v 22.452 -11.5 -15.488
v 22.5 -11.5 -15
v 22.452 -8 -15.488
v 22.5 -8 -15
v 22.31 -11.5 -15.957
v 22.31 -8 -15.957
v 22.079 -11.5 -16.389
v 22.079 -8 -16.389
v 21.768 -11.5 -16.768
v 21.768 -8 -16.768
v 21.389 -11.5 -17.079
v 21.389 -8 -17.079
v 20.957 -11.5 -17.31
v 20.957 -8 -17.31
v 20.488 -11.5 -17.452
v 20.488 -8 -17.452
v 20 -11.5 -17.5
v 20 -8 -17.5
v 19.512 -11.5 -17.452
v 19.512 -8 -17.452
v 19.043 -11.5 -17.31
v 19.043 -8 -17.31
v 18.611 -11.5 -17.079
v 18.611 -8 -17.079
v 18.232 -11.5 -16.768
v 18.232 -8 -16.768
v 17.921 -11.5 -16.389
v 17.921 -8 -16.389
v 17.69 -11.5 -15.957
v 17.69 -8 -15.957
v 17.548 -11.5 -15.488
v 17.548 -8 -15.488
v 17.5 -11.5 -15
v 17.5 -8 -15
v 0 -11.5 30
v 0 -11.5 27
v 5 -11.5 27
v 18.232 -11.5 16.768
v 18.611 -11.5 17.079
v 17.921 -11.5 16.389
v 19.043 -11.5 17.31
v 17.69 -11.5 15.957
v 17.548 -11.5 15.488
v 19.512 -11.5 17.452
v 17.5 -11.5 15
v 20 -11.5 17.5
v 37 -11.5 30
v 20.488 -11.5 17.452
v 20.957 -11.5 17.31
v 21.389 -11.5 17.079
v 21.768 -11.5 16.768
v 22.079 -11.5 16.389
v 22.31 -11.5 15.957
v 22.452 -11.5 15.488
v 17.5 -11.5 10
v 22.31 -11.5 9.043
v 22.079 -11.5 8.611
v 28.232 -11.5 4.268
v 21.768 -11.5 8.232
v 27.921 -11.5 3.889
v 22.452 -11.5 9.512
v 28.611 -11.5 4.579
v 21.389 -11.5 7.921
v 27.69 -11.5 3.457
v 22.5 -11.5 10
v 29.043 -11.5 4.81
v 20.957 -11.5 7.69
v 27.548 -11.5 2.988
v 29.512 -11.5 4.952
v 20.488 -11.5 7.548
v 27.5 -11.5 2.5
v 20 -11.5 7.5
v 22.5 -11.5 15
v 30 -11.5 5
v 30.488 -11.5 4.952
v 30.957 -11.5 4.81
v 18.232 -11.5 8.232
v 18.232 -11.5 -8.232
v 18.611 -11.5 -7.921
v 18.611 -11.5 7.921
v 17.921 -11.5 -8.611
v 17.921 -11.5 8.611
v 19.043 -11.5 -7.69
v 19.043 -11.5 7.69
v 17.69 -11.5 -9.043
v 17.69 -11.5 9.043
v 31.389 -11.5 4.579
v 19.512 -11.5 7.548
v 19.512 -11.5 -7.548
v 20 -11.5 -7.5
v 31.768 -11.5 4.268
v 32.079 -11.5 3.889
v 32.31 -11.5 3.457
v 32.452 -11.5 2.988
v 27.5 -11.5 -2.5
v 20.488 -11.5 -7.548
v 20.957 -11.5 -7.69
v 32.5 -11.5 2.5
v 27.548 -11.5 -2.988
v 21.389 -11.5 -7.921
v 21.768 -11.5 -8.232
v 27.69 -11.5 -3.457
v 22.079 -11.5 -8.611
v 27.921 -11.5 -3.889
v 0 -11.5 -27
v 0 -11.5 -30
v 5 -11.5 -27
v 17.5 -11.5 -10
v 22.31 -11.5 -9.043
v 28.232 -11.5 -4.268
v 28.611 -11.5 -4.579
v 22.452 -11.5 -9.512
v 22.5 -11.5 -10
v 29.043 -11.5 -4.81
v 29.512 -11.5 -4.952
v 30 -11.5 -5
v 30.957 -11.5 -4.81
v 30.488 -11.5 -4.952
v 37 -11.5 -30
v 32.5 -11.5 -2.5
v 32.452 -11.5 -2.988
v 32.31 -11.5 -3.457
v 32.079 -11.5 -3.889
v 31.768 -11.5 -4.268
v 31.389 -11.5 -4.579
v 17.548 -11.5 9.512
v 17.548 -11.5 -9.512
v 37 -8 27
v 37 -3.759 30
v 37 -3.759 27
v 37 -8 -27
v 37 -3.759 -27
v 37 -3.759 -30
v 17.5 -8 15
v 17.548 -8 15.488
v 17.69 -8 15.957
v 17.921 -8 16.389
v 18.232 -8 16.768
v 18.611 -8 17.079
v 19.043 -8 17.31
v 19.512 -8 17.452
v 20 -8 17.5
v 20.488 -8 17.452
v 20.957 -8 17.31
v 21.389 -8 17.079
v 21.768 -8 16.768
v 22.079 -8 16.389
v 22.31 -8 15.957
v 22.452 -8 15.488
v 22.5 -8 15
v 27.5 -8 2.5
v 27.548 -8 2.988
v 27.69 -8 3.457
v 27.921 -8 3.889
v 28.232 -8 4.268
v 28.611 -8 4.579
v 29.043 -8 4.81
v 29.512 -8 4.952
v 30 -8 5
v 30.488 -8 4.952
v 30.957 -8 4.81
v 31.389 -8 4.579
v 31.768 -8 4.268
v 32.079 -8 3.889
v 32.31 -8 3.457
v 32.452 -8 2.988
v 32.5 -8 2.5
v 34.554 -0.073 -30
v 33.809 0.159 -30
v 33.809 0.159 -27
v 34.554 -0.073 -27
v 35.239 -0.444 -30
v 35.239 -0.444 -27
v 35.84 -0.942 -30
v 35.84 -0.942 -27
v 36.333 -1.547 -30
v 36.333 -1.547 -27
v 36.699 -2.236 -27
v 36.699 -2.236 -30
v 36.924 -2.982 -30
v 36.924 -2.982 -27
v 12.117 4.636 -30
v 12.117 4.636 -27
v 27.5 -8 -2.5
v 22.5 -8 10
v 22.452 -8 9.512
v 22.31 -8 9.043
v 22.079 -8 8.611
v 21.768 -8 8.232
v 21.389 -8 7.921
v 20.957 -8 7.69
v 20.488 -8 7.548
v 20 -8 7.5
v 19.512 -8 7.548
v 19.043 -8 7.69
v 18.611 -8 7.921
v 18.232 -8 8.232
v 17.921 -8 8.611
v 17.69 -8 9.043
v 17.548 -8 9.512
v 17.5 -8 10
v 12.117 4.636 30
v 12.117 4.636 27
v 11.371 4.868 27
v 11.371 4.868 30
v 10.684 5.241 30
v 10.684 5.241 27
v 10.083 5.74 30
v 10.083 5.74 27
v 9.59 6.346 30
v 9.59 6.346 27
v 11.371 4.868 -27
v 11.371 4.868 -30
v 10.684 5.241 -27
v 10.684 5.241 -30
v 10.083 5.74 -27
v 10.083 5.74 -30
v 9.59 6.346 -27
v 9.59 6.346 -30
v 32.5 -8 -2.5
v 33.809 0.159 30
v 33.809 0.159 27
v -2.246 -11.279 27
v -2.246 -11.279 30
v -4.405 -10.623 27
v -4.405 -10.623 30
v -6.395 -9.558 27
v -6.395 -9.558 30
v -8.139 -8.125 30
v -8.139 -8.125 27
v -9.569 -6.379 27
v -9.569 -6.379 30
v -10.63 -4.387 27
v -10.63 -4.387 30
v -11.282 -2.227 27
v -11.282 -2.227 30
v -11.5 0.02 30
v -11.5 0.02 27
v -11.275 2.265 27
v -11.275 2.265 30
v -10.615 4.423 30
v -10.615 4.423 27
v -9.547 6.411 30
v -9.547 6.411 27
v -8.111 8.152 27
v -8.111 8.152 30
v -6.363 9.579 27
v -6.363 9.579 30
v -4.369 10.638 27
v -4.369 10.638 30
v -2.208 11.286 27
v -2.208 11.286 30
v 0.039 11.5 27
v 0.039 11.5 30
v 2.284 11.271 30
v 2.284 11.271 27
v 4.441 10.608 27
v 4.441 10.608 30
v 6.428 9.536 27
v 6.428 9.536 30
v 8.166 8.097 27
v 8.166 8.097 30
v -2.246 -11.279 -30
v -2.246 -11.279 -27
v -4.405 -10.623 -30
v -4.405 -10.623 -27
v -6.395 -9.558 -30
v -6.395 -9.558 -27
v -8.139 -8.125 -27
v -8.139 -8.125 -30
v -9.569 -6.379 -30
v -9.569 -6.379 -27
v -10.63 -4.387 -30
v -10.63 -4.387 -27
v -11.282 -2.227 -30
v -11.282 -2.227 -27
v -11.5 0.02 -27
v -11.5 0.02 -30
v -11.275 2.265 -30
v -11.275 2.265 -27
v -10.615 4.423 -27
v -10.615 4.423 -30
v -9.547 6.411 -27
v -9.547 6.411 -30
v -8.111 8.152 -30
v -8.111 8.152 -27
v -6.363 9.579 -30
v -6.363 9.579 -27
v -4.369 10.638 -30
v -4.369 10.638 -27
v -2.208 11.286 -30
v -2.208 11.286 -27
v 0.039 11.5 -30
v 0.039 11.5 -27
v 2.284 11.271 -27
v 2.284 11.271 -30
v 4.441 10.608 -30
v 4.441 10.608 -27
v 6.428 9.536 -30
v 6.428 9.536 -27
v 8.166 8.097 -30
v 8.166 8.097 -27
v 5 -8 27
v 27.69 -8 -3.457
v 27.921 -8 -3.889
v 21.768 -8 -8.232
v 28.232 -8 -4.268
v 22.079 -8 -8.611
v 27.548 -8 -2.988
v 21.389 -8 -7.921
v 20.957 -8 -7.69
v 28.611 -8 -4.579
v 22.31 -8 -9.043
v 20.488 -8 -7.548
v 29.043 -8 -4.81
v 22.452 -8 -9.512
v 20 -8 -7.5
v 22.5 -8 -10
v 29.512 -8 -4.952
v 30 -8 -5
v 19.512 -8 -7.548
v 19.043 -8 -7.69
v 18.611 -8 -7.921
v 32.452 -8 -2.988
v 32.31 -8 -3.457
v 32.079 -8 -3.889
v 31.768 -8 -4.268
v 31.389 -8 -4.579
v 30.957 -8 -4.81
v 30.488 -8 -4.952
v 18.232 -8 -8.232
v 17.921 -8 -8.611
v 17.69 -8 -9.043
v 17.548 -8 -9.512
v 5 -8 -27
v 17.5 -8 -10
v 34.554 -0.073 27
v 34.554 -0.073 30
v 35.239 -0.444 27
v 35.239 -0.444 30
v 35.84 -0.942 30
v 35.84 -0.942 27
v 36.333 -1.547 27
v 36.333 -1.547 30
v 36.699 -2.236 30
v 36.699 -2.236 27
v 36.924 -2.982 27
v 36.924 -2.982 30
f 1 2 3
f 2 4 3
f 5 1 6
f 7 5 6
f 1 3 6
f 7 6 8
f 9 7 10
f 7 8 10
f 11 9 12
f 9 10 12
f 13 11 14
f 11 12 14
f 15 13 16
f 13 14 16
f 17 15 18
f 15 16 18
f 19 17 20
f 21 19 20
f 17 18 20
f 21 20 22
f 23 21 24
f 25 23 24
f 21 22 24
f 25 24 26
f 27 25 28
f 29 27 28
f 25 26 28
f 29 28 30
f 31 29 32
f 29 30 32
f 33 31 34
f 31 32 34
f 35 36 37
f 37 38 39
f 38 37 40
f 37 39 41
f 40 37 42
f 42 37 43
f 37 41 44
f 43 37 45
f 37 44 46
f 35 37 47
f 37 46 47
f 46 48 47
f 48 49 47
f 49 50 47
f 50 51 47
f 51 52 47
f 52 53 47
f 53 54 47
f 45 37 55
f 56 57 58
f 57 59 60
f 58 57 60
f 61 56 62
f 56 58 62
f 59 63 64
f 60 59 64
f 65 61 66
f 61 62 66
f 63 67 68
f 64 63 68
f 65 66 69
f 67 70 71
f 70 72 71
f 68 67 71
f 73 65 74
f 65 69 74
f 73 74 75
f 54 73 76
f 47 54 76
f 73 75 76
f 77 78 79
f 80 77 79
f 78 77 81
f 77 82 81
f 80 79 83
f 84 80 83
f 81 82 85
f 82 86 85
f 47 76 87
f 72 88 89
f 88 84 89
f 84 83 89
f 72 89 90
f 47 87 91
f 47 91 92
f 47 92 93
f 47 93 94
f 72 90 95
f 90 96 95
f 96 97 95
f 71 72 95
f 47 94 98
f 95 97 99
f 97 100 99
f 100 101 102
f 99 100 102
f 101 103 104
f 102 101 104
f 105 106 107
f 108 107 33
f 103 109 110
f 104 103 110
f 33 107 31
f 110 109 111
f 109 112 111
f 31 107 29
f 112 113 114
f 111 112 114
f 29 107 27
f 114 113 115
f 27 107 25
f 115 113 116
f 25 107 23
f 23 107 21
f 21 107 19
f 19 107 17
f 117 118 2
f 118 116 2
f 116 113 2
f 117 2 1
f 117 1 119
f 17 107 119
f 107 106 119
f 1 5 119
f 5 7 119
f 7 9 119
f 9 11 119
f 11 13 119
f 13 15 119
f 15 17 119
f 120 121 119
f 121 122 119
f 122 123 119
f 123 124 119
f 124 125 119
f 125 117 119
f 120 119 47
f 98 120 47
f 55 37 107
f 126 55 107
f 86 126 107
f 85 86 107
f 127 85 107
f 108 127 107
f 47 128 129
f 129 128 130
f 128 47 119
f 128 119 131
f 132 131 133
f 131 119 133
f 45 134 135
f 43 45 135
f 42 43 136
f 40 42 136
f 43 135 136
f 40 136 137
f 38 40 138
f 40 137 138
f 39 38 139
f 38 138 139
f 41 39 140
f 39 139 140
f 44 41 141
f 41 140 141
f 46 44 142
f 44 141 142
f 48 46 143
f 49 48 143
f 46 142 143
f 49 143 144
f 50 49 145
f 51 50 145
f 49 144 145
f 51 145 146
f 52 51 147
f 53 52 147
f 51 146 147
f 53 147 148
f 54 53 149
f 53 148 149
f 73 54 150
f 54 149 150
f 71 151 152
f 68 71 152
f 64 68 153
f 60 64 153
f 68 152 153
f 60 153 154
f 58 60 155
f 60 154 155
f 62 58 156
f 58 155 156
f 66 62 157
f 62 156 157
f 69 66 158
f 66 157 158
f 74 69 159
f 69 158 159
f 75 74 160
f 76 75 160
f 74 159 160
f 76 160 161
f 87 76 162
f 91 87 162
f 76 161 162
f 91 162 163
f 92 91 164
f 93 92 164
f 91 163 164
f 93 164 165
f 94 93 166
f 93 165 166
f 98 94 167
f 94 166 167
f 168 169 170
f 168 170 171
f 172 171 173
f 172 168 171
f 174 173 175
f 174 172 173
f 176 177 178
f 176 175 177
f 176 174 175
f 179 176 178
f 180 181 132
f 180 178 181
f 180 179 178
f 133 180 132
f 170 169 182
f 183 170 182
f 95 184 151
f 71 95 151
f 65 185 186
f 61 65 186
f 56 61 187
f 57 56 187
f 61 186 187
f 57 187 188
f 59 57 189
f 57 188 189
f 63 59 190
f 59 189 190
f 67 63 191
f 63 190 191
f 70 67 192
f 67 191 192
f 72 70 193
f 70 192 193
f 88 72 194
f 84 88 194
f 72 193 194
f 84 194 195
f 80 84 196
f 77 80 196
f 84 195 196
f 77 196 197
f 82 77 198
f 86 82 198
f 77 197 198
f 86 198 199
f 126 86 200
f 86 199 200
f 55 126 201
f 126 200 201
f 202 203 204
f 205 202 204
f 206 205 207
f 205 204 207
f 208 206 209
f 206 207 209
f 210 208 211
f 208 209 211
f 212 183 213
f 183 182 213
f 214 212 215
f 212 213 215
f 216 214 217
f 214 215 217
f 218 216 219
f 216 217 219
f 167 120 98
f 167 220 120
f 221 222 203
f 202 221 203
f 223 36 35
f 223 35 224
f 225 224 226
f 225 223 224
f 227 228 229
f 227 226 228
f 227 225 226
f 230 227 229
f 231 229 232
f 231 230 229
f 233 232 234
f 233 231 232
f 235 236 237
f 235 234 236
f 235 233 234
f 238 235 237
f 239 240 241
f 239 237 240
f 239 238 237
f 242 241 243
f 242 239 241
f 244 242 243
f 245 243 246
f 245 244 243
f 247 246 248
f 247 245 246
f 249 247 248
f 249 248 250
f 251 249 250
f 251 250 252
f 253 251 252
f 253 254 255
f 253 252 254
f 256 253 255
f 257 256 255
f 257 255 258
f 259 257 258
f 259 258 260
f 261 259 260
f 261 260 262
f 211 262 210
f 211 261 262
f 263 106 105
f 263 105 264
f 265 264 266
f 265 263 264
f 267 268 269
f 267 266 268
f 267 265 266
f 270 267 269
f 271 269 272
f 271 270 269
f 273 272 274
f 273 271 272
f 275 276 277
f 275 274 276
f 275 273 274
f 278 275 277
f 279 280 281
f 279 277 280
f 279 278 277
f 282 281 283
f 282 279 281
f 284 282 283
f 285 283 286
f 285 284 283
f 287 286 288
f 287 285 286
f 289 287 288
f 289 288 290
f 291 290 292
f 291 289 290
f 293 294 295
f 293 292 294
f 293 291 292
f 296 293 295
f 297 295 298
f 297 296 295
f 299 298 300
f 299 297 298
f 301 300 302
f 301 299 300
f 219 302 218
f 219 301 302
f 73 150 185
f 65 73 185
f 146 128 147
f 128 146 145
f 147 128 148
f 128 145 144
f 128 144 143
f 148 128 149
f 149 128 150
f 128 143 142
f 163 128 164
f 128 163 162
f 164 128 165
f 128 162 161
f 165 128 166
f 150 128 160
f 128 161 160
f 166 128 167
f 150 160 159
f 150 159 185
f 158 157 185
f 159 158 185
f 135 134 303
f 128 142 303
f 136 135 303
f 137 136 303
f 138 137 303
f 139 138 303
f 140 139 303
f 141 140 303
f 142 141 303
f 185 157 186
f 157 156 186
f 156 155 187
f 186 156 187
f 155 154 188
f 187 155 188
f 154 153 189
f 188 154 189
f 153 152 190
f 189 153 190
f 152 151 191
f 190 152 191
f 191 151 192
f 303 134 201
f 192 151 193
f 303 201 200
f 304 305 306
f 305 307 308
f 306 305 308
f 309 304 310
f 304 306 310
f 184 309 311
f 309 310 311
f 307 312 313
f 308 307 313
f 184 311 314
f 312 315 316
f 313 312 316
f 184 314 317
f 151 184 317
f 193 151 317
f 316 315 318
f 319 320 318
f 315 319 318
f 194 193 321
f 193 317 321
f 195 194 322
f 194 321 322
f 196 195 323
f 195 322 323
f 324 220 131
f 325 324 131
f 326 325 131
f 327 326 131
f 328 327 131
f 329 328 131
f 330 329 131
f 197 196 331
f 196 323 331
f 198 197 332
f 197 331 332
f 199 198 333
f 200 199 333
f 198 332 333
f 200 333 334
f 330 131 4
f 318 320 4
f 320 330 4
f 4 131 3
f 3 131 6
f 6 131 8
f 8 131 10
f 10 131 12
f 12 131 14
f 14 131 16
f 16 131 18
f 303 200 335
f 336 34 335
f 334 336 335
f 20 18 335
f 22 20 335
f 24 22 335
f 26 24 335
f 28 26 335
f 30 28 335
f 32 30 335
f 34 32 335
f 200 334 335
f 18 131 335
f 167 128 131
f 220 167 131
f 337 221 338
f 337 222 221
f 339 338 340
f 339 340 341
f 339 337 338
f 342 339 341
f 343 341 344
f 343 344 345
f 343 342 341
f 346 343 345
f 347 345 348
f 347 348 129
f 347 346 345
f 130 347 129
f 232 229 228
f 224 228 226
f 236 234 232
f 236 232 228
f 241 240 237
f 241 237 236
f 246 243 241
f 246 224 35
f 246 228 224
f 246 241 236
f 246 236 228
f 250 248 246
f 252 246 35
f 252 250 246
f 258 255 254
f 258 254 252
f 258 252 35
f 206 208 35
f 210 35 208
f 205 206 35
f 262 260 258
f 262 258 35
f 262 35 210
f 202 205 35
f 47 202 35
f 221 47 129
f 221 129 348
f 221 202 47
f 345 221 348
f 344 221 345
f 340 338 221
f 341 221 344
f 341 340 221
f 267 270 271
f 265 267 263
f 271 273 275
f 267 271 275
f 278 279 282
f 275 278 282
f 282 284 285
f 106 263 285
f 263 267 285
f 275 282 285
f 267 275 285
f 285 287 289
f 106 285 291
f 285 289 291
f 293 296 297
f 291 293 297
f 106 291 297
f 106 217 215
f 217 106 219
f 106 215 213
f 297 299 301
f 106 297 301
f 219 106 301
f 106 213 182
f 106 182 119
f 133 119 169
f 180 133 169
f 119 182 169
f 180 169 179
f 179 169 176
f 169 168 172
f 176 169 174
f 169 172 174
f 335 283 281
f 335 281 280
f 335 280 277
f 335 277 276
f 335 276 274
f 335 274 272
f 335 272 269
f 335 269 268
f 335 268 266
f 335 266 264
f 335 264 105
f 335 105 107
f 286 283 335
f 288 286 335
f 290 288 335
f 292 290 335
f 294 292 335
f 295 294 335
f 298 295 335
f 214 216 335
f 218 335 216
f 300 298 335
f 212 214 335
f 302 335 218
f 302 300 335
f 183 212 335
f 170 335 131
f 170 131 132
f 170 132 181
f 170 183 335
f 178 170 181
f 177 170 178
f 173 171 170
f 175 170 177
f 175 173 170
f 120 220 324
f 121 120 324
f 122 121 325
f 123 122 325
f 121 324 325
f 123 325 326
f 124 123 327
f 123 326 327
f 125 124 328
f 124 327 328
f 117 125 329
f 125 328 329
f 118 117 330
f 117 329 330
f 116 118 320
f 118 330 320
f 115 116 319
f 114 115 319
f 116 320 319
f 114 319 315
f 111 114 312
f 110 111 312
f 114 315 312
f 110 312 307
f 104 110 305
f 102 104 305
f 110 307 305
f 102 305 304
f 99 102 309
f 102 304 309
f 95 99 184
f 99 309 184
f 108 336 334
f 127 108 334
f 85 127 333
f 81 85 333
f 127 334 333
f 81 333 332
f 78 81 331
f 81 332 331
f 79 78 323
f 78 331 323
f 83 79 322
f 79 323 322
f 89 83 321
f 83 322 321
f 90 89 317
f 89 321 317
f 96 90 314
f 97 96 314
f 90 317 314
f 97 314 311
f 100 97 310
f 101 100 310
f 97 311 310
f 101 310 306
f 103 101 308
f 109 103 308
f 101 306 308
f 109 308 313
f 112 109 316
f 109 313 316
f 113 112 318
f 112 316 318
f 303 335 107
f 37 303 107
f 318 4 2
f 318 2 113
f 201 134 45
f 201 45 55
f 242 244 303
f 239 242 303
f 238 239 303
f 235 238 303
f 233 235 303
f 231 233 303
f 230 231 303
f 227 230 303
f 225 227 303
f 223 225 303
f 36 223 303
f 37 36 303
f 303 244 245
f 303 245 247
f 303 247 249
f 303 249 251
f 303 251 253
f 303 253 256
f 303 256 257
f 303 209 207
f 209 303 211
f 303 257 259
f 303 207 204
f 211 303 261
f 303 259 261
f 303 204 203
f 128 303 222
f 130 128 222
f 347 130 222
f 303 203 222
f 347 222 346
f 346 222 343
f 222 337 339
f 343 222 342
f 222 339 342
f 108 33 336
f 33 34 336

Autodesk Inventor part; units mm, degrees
ref_plane "YZ Plane" through (0, 0, 0) normal (1, 0, 0) x (0, 1, 0)
ref_plane "XZ Plane" through (0, 0, 0) normal (0, 1, 0) x (-1, 0, 0)
ref_plane "XY Plane" through (0, 0, 0) normal (0, 0, 1) x (1, 0, 0)
sketch "Sketch1" plane through (0, 0, 0) normal (0, 0, 1) x (1, 0, 0)
  circle A0 centre (0, 0) radius 11.5
  line L0 (5, -11.5) -> (37, -11.5)
  line L1 (37, -11.5) -> (37, -8)
  line L2 (37, -8) -> (5, -8)
  line L3 (5, -8) -> (5, -11.5)
  line L4 (37, -8) -> (37, -0.5)
  line L5 (37, -0.5) -> (10.3562, 5)
  line L6 (0, 0) -> (0, -11.5) construction
  line L7 (0, -11.5) -> (5, -11.5)
  dimension "d0" = 23
  dimension "d2" = 3.5
  dimension "d3" = 11
  dimension "d4" = 5
  dimension "d5" = 5
  dimension "d6" = 37
extrude "Extrusion1" add sketch "Sketch1" along normal mid plane 60
extrude "Extrusion2" cut sketch "Sketch1" along normal mid plane 54 contours A0 L2 L3 | A0 L5 L4 L2 | A0 L3 L7 picked at (-2.9713, 3.3704)
sketch "Sketch2" plane through (0, 0, 0) normal (0, 1, 0) x (-1, 0, 0)
  line L0 (0, 0) -> (-30, 0) construction
  arc A0 (-27.5, -2.5) -> (-32.5, -2.5) centre (-30, -2.5) ccw construction
  arc A1 (-32.5, 2.5) -> (-27.5, 2.5) centre (-30, 2.5) ccw construction
  line L1 (-32.5, -2.5) -> (-32.5, 2.5)
  line L2 (-27.5, -2.5) -> (-27.5, 2.5)
  line L3 (-30, -2.5) -> (-30, 2.5) construction
  arc A2 (-32.5, -2.5) -> (-27.5, -2.5) centre (-30, -2.5) ccw
  arc A3 (-27.5, 2.5) -> (-32.5, 2.5) centre (-30, 2.5) ccw
  line L4 (-22.5, -15) -> (-22.5, -10)
  line L5 (-17.5, -15) -> (-17.5, -10)
  arc A4 (-22.5, -15) -> (-17.5, -15) centre (-20, -15) ccw
  arc A5 (-17.5, -10) -> (-22.5, -10) centre (-20, -10) ccw
  line L6 (-20, -15) -> (-20, -10) construction
  arc A6 (-17.5, 15) -> (-22.5, 15) centre (-20, 15) ccw
  line L7 (-22.5, 15) -> (-22.5, 10)
  line L8 (-17.5, 15) -> (-17.5, 10)
  arc A7 (-22.5, 10) -> (-17.5, 10) centre (-20, 10) ccw
  line L9 (-20, 15) -> (-20, 10) construction
  line L10 (-17.5, -12.5) -> (-22.5, -12.5) construction
  line L11 (-17.5, 12.5) -> (-22.5, 12.5) construction
  dimension "d13" = 30
  dimension "d18" = 5
  dimension "d19" = 5
  dimension "d22" = 10
  dimension "d23" = 25
extrude "Extrusion3" cut sketch "Sketch2" against normal through all
fillet "Fillet1" radius 4 4 edges at (37, -0.5, -28.5) (37, -0.5, 28.5) (10.3562, 5, -28.5) (10.3562, 5, 28.5)
properties part number "carrier-end" material "ABS Plastic"
